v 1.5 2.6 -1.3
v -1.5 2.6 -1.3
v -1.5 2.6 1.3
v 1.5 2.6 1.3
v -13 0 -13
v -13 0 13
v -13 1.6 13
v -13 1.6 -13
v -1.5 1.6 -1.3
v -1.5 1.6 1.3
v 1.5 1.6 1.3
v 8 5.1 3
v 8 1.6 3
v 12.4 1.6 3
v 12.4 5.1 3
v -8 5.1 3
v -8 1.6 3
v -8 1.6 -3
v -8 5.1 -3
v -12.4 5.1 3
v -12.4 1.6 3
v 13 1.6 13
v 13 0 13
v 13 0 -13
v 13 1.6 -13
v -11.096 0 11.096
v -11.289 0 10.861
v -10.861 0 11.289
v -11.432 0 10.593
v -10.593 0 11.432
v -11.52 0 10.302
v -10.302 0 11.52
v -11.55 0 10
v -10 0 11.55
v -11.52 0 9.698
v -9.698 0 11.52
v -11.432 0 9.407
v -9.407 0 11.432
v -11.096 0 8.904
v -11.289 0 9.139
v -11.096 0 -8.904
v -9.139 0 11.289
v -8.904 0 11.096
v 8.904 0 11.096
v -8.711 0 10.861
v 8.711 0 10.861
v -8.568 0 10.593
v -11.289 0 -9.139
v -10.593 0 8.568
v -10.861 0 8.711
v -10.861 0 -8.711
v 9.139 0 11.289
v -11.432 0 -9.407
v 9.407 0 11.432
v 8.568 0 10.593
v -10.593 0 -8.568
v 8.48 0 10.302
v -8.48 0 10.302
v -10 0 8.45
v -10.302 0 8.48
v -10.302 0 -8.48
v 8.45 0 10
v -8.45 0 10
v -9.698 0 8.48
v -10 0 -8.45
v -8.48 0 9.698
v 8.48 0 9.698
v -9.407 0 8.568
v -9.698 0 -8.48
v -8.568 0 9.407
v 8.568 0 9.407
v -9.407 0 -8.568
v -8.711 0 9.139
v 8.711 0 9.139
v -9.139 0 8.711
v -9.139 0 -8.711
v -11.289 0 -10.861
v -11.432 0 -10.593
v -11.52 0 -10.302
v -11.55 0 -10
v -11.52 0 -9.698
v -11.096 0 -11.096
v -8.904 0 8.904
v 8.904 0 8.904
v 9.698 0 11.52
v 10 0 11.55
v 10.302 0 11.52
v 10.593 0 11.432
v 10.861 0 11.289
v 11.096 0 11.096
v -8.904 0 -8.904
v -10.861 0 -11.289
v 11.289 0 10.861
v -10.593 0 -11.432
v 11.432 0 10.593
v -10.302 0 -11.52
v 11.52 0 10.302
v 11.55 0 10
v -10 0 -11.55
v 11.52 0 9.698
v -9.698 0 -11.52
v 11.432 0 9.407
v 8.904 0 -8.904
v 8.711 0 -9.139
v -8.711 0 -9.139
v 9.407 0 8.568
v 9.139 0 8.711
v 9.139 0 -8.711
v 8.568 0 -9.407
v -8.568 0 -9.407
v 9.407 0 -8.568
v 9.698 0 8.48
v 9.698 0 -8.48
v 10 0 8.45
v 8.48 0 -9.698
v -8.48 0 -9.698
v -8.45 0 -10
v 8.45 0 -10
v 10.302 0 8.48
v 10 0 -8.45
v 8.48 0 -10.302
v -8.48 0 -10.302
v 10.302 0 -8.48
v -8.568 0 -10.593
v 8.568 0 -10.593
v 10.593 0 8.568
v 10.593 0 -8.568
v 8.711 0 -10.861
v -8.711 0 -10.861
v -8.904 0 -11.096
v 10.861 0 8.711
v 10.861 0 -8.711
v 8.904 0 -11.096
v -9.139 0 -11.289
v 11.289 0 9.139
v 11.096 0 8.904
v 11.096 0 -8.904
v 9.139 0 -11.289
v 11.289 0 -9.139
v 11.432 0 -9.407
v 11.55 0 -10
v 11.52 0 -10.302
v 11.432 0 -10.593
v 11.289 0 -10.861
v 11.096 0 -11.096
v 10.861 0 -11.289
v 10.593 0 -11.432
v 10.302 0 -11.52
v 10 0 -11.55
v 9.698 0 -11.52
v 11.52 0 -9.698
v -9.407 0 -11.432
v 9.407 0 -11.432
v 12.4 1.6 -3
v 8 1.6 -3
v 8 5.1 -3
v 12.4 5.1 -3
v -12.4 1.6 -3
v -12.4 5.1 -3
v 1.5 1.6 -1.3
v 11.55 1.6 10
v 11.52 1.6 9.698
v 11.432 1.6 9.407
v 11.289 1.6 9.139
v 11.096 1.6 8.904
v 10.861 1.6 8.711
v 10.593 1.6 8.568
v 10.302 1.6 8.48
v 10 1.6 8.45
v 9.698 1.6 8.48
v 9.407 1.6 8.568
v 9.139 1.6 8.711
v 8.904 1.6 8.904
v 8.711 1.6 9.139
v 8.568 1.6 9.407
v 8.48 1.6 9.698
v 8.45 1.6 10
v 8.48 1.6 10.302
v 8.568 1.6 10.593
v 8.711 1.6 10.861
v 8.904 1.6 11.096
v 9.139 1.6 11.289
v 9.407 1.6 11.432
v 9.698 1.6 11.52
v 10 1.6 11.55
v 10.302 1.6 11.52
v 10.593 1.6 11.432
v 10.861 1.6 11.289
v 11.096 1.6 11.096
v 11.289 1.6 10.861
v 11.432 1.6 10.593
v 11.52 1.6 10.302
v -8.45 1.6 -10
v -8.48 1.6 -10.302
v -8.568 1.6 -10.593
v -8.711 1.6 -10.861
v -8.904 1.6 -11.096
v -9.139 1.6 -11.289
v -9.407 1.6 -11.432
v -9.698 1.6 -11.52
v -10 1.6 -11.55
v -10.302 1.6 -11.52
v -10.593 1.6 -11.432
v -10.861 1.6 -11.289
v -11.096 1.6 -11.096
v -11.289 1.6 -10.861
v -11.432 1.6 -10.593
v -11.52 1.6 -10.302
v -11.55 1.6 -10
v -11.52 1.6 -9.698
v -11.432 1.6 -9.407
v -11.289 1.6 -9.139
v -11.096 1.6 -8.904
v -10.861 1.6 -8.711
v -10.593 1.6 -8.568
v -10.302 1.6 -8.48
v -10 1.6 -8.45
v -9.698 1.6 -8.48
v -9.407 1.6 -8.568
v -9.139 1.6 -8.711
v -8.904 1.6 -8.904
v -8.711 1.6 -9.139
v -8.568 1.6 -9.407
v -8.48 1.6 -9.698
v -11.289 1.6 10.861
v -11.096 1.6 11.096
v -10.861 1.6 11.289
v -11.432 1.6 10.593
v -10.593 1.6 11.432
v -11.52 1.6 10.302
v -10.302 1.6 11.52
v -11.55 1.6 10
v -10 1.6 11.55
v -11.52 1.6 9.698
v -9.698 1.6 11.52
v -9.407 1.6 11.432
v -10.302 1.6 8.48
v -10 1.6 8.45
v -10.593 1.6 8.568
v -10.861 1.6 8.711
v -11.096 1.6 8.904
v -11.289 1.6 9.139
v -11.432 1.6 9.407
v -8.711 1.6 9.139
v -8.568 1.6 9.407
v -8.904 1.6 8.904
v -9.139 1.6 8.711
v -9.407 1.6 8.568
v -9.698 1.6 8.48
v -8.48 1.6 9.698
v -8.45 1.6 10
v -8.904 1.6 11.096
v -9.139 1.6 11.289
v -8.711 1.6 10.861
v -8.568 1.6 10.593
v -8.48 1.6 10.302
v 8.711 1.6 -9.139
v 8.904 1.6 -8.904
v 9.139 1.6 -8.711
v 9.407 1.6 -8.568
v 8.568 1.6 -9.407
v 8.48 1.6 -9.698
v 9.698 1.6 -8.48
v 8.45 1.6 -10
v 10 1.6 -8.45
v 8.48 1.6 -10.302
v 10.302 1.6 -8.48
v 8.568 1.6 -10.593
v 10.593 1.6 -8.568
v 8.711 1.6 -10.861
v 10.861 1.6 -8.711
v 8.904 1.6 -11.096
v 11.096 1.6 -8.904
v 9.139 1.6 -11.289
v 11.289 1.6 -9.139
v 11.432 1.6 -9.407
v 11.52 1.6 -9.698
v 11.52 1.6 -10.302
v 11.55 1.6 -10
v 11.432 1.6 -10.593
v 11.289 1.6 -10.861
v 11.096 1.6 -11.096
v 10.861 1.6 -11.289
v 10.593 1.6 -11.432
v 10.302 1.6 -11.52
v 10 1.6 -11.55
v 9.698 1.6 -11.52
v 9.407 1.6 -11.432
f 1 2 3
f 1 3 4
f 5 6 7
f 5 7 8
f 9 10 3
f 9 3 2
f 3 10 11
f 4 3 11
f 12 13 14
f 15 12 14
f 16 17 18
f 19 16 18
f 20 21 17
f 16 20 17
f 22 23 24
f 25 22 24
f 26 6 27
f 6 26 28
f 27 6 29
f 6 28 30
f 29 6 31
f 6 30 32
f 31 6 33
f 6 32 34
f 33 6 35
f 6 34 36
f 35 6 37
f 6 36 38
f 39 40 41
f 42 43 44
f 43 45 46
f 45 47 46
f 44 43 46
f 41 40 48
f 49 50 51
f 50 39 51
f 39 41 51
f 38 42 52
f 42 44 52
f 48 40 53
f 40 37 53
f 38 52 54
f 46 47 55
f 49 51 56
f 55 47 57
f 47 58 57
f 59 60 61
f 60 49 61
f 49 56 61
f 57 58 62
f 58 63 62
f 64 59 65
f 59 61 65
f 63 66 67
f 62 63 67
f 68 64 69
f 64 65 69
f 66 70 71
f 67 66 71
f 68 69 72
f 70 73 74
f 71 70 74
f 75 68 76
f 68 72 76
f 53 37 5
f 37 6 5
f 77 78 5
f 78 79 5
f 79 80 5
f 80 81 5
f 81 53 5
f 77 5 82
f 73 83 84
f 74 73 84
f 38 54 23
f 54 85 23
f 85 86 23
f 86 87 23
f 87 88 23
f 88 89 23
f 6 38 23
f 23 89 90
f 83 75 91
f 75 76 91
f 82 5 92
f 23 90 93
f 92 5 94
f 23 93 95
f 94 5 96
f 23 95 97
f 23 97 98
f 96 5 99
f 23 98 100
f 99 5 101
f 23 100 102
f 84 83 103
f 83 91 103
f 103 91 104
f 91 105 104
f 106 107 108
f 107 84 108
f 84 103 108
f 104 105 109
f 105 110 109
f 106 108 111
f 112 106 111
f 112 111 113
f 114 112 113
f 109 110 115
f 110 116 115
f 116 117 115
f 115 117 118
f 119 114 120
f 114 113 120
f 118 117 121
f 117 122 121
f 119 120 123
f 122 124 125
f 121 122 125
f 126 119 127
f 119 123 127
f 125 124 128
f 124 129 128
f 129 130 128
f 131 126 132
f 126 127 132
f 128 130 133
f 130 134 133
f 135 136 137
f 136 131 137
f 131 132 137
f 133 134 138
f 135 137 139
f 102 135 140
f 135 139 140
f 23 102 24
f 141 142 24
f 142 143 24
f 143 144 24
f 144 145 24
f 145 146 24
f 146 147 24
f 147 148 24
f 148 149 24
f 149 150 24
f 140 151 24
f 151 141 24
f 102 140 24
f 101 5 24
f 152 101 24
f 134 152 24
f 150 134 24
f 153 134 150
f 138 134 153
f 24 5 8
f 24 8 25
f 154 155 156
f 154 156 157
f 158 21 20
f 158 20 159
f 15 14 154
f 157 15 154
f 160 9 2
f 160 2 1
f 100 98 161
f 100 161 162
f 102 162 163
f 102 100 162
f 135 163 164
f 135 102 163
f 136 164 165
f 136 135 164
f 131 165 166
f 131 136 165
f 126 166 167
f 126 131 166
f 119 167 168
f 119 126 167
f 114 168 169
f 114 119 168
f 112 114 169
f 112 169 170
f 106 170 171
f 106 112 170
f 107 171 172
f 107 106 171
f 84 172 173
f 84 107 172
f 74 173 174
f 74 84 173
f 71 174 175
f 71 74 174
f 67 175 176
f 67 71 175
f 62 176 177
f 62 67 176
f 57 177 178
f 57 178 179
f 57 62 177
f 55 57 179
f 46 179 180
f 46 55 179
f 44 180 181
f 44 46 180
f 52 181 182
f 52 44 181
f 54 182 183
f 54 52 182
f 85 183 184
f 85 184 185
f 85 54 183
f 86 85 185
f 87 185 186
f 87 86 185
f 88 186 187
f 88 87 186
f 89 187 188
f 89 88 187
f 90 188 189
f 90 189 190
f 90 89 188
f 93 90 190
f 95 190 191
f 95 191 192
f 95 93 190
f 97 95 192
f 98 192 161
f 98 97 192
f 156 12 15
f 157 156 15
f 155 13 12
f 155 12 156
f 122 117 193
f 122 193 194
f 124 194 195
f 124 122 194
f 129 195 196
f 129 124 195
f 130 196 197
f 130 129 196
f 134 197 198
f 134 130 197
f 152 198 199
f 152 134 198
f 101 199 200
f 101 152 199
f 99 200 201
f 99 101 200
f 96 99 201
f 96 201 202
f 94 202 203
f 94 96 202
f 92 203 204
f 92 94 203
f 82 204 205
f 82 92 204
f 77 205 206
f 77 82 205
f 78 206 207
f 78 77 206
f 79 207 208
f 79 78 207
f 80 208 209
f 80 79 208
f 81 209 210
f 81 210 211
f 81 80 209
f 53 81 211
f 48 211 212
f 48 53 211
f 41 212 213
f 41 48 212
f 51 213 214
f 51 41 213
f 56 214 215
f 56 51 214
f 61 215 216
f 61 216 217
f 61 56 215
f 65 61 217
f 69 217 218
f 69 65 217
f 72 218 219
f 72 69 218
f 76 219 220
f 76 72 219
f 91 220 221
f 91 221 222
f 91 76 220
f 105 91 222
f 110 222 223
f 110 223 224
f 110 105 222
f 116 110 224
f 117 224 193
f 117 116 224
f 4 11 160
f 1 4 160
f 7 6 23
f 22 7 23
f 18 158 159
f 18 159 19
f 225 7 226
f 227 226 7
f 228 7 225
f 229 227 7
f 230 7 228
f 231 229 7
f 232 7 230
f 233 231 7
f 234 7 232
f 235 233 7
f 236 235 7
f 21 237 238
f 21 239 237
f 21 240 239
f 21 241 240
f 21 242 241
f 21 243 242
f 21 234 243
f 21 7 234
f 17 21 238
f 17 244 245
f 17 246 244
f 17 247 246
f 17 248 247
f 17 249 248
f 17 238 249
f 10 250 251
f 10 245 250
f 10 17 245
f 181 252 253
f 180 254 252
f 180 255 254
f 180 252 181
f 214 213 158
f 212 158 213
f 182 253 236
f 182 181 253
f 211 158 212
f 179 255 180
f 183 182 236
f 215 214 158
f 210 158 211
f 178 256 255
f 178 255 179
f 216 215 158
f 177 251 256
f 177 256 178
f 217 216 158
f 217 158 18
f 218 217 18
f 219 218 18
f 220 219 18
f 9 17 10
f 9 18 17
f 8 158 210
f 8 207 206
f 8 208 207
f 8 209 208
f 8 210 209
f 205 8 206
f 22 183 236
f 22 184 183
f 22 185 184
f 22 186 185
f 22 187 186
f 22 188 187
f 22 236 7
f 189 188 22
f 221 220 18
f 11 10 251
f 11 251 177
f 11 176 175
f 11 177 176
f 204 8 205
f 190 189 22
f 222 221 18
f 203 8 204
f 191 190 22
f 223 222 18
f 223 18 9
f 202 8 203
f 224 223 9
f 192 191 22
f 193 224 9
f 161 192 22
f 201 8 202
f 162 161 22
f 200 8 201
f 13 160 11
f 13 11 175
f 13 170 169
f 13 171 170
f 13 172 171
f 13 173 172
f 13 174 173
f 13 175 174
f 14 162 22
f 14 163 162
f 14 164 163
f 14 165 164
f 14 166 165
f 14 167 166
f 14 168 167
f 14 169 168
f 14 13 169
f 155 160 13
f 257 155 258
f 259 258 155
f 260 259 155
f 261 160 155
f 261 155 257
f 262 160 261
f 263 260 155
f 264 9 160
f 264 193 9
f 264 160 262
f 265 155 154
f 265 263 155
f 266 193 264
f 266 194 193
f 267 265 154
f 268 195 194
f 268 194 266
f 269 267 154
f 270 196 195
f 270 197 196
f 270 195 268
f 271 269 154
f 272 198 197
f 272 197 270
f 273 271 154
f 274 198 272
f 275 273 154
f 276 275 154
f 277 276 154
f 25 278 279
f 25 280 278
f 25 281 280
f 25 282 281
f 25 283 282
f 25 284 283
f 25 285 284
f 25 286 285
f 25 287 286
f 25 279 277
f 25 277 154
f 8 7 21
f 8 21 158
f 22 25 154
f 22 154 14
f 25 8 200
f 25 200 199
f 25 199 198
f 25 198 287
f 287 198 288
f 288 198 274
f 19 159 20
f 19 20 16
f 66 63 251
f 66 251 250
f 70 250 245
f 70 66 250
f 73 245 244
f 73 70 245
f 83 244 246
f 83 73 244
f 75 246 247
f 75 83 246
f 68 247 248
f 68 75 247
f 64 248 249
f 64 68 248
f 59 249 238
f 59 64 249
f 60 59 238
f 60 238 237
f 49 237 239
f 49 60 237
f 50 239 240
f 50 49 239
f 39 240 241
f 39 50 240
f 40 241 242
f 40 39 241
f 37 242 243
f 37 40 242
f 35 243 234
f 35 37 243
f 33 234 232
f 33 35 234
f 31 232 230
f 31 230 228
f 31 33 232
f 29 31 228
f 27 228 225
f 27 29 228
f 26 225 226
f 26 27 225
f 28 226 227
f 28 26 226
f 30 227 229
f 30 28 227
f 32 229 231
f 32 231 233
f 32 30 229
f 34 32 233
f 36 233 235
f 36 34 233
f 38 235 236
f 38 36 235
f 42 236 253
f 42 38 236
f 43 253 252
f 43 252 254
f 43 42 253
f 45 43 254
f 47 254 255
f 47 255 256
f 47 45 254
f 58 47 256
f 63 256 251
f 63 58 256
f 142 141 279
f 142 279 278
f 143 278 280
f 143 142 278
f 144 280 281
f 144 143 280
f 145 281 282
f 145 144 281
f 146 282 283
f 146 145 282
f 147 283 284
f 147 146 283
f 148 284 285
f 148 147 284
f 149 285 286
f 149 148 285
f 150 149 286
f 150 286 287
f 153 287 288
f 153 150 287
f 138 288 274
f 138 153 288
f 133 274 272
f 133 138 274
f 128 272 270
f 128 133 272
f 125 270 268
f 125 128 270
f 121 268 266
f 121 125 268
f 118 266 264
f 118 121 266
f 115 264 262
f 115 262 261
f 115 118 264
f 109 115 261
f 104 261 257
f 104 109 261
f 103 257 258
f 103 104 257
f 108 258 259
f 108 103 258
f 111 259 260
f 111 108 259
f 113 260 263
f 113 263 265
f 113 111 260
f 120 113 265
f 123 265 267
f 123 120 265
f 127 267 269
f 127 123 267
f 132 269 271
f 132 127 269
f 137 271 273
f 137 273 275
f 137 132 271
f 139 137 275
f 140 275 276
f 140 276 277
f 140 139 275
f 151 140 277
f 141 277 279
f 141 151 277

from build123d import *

# Parameters (mm, degrees)
SKETCH1_W           = 26
SKETCH1_H           = 26
SKETCH1_R           = 1.55
BOSS_EXTRUDE1_DEPTH = 1.6
SKETCH2_W           = 4.4
SKETCH2_H           = 6
BOSS_EXTRUDE2_DEPTH = 3.5
SKETCH3_W           = 3
SKETCH3_H           = 2.6
BOSS_EXTRUDE3_DEPTH = 1


with BuildPart() as part:
    # Sketch1 → Boss-Extrude1 (new body)
    with BuildSketch(Plane(origin=(0, 0, 0), x_dir=(1, 0, 0), z_dir=(0, 1, 0))):
        Rectangle(SKETCH1_W, SKETCH1_H)
        with Locations((-10, 10)):
            Circle(SKETCH1_R, mode=Mode.SUBTRACT)
        with Locations((10, 10)):
            Circle(SKETCH1_R, mode=Mode.SUBTRACT)
        with Locations((10, -10)):
            Circle(SKETCH1_R, mode=Mode.SUBTRACT)
        with Locations((-10, -10)):
            Circle(SKETCH1_R, mode=Mode.SUBTRACT)
    extrude(amount=BOSS_EXTRUDE1_DEPTH)

    # Sketch2 → Boss-Extrude2 (add)
    with BuildSketch(Plane(origin=(0, 1.6, 0), x_dir=(1, 0, 0), z_dir=(0, 1, 0))):
        with Locations((-10.2, 0)):
            Rectangle(SKETCH2_W, SKETCH2_H)
        with Locations((10.2, 0)):
            Rectangle(SKETCH2_W, SKETCH2_H)
    extrude(amount=BOSS_EXTRUDE2_DEPTH)

    # Sketch3 → Boss-Extrude3 (add)
    with BuildSketch(Plane(origin=(0, 1.6, 0), x_dir=(1, 0, 0), z_dir=(0, 1, 0))):
        Rectangle(SKETCH3_W, SKETCH3_H)
    extrude(amount=BOSS_EXTRUDE3_DEPTH)


solid = part.part
